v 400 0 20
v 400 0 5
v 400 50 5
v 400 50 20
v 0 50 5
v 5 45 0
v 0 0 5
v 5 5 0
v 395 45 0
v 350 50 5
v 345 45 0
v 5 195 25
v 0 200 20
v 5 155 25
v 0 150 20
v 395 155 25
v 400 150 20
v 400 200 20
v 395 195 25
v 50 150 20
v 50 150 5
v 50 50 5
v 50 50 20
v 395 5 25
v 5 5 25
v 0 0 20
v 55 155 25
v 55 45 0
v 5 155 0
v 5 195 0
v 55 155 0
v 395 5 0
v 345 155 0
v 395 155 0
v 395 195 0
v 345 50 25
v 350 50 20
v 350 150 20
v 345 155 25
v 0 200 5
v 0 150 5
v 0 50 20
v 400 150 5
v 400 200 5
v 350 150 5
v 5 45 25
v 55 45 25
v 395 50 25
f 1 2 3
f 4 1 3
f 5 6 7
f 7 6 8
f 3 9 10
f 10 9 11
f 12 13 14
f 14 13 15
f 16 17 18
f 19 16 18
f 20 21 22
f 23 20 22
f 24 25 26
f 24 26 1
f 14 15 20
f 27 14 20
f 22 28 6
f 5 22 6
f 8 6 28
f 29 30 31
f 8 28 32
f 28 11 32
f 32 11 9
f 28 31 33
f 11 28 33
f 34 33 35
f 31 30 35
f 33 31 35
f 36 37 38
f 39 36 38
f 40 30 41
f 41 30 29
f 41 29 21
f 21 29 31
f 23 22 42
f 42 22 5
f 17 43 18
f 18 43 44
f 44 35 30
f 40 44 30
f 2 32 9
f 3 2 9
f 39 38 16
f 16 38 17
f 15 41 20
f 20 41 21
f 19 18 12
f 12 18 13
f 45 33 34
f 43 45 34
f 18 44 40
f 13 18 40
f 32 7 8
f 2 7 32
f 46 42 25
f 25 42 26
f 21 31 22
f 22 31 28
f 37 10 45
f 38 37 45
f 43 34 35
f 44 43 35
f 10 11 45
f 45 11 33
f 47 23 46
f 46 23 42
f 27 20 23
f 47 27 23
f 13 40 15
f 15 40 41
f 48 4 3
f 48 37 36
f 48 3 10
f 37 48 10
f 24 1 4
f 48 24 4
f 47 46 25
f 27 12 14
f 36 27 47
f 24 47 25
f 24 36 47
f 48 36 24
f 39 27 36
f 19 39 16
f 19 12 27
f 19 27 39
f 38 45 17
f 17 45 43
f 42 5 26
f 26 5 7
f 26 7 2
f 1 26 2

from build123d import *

# Parameters (mm, degrees)
F1_DEPTH = 25
F2_SIZE  = 5
F3_SIZE  = 5
F5_SIZE  = 5


# Not quite as in the source:
# - a feature of the source that left no trace in its solid (it failed there, or was rolled back) is left out


with BuildPart() as f1:
    # F0 (on Top) → F1 (new body)
    with BuildSketch(Plane.XY):
        Polygon((0, 50), (0, 0), (400, 0), (400, 50), (350, 50), (350, 150), (400, 150), (400, 200), (0, 200), (0, 150), (50, 150), (50, 50), align=None)
    extrude(amount=F1_DEPTH)

    # F2
    f2_edges = [f1.edges().sort_by_distance(p)[0] for p in [
        (200, 0, 25),
    ]]
    chamfer(f2_edges, length=F2_SIZE)

    # F3
    f3_edges = [f1.edges().sort_by_distance(p)[0] for p in [
        (200, 200, 25),
    ]]
    chamfer(f3_edges, length=F3_SIZE)

    # F5
    f5_edges = [f1.edges().sort_by_distance(p)[0] for p in [
        (200, 0, 0),
        (200, 200, 0),
        (350, 100, 0),
        (375, 50, 0),
        (400, 25, 0),
        (400, 175, 0),
        (375, 150, 0),
        (0, 175, 0),
        (25, 150, 0),
        (50, 100, 0),
        (25, 50, 0),
        (0, 25, 0),
        (0, 172.5, 25),
        (25, 150, 25),
        (400, 172.5, 25),
        (50, 100, 25),
        (375, 150, 25),
        (25, 50, 25),
        (350, 100, 25),
        (0, 27.5, 25),
        (400, 27.5, 25),
    ]]
    chamfer(f5_edges, length=F5_SIZE)


solid = f1.part
